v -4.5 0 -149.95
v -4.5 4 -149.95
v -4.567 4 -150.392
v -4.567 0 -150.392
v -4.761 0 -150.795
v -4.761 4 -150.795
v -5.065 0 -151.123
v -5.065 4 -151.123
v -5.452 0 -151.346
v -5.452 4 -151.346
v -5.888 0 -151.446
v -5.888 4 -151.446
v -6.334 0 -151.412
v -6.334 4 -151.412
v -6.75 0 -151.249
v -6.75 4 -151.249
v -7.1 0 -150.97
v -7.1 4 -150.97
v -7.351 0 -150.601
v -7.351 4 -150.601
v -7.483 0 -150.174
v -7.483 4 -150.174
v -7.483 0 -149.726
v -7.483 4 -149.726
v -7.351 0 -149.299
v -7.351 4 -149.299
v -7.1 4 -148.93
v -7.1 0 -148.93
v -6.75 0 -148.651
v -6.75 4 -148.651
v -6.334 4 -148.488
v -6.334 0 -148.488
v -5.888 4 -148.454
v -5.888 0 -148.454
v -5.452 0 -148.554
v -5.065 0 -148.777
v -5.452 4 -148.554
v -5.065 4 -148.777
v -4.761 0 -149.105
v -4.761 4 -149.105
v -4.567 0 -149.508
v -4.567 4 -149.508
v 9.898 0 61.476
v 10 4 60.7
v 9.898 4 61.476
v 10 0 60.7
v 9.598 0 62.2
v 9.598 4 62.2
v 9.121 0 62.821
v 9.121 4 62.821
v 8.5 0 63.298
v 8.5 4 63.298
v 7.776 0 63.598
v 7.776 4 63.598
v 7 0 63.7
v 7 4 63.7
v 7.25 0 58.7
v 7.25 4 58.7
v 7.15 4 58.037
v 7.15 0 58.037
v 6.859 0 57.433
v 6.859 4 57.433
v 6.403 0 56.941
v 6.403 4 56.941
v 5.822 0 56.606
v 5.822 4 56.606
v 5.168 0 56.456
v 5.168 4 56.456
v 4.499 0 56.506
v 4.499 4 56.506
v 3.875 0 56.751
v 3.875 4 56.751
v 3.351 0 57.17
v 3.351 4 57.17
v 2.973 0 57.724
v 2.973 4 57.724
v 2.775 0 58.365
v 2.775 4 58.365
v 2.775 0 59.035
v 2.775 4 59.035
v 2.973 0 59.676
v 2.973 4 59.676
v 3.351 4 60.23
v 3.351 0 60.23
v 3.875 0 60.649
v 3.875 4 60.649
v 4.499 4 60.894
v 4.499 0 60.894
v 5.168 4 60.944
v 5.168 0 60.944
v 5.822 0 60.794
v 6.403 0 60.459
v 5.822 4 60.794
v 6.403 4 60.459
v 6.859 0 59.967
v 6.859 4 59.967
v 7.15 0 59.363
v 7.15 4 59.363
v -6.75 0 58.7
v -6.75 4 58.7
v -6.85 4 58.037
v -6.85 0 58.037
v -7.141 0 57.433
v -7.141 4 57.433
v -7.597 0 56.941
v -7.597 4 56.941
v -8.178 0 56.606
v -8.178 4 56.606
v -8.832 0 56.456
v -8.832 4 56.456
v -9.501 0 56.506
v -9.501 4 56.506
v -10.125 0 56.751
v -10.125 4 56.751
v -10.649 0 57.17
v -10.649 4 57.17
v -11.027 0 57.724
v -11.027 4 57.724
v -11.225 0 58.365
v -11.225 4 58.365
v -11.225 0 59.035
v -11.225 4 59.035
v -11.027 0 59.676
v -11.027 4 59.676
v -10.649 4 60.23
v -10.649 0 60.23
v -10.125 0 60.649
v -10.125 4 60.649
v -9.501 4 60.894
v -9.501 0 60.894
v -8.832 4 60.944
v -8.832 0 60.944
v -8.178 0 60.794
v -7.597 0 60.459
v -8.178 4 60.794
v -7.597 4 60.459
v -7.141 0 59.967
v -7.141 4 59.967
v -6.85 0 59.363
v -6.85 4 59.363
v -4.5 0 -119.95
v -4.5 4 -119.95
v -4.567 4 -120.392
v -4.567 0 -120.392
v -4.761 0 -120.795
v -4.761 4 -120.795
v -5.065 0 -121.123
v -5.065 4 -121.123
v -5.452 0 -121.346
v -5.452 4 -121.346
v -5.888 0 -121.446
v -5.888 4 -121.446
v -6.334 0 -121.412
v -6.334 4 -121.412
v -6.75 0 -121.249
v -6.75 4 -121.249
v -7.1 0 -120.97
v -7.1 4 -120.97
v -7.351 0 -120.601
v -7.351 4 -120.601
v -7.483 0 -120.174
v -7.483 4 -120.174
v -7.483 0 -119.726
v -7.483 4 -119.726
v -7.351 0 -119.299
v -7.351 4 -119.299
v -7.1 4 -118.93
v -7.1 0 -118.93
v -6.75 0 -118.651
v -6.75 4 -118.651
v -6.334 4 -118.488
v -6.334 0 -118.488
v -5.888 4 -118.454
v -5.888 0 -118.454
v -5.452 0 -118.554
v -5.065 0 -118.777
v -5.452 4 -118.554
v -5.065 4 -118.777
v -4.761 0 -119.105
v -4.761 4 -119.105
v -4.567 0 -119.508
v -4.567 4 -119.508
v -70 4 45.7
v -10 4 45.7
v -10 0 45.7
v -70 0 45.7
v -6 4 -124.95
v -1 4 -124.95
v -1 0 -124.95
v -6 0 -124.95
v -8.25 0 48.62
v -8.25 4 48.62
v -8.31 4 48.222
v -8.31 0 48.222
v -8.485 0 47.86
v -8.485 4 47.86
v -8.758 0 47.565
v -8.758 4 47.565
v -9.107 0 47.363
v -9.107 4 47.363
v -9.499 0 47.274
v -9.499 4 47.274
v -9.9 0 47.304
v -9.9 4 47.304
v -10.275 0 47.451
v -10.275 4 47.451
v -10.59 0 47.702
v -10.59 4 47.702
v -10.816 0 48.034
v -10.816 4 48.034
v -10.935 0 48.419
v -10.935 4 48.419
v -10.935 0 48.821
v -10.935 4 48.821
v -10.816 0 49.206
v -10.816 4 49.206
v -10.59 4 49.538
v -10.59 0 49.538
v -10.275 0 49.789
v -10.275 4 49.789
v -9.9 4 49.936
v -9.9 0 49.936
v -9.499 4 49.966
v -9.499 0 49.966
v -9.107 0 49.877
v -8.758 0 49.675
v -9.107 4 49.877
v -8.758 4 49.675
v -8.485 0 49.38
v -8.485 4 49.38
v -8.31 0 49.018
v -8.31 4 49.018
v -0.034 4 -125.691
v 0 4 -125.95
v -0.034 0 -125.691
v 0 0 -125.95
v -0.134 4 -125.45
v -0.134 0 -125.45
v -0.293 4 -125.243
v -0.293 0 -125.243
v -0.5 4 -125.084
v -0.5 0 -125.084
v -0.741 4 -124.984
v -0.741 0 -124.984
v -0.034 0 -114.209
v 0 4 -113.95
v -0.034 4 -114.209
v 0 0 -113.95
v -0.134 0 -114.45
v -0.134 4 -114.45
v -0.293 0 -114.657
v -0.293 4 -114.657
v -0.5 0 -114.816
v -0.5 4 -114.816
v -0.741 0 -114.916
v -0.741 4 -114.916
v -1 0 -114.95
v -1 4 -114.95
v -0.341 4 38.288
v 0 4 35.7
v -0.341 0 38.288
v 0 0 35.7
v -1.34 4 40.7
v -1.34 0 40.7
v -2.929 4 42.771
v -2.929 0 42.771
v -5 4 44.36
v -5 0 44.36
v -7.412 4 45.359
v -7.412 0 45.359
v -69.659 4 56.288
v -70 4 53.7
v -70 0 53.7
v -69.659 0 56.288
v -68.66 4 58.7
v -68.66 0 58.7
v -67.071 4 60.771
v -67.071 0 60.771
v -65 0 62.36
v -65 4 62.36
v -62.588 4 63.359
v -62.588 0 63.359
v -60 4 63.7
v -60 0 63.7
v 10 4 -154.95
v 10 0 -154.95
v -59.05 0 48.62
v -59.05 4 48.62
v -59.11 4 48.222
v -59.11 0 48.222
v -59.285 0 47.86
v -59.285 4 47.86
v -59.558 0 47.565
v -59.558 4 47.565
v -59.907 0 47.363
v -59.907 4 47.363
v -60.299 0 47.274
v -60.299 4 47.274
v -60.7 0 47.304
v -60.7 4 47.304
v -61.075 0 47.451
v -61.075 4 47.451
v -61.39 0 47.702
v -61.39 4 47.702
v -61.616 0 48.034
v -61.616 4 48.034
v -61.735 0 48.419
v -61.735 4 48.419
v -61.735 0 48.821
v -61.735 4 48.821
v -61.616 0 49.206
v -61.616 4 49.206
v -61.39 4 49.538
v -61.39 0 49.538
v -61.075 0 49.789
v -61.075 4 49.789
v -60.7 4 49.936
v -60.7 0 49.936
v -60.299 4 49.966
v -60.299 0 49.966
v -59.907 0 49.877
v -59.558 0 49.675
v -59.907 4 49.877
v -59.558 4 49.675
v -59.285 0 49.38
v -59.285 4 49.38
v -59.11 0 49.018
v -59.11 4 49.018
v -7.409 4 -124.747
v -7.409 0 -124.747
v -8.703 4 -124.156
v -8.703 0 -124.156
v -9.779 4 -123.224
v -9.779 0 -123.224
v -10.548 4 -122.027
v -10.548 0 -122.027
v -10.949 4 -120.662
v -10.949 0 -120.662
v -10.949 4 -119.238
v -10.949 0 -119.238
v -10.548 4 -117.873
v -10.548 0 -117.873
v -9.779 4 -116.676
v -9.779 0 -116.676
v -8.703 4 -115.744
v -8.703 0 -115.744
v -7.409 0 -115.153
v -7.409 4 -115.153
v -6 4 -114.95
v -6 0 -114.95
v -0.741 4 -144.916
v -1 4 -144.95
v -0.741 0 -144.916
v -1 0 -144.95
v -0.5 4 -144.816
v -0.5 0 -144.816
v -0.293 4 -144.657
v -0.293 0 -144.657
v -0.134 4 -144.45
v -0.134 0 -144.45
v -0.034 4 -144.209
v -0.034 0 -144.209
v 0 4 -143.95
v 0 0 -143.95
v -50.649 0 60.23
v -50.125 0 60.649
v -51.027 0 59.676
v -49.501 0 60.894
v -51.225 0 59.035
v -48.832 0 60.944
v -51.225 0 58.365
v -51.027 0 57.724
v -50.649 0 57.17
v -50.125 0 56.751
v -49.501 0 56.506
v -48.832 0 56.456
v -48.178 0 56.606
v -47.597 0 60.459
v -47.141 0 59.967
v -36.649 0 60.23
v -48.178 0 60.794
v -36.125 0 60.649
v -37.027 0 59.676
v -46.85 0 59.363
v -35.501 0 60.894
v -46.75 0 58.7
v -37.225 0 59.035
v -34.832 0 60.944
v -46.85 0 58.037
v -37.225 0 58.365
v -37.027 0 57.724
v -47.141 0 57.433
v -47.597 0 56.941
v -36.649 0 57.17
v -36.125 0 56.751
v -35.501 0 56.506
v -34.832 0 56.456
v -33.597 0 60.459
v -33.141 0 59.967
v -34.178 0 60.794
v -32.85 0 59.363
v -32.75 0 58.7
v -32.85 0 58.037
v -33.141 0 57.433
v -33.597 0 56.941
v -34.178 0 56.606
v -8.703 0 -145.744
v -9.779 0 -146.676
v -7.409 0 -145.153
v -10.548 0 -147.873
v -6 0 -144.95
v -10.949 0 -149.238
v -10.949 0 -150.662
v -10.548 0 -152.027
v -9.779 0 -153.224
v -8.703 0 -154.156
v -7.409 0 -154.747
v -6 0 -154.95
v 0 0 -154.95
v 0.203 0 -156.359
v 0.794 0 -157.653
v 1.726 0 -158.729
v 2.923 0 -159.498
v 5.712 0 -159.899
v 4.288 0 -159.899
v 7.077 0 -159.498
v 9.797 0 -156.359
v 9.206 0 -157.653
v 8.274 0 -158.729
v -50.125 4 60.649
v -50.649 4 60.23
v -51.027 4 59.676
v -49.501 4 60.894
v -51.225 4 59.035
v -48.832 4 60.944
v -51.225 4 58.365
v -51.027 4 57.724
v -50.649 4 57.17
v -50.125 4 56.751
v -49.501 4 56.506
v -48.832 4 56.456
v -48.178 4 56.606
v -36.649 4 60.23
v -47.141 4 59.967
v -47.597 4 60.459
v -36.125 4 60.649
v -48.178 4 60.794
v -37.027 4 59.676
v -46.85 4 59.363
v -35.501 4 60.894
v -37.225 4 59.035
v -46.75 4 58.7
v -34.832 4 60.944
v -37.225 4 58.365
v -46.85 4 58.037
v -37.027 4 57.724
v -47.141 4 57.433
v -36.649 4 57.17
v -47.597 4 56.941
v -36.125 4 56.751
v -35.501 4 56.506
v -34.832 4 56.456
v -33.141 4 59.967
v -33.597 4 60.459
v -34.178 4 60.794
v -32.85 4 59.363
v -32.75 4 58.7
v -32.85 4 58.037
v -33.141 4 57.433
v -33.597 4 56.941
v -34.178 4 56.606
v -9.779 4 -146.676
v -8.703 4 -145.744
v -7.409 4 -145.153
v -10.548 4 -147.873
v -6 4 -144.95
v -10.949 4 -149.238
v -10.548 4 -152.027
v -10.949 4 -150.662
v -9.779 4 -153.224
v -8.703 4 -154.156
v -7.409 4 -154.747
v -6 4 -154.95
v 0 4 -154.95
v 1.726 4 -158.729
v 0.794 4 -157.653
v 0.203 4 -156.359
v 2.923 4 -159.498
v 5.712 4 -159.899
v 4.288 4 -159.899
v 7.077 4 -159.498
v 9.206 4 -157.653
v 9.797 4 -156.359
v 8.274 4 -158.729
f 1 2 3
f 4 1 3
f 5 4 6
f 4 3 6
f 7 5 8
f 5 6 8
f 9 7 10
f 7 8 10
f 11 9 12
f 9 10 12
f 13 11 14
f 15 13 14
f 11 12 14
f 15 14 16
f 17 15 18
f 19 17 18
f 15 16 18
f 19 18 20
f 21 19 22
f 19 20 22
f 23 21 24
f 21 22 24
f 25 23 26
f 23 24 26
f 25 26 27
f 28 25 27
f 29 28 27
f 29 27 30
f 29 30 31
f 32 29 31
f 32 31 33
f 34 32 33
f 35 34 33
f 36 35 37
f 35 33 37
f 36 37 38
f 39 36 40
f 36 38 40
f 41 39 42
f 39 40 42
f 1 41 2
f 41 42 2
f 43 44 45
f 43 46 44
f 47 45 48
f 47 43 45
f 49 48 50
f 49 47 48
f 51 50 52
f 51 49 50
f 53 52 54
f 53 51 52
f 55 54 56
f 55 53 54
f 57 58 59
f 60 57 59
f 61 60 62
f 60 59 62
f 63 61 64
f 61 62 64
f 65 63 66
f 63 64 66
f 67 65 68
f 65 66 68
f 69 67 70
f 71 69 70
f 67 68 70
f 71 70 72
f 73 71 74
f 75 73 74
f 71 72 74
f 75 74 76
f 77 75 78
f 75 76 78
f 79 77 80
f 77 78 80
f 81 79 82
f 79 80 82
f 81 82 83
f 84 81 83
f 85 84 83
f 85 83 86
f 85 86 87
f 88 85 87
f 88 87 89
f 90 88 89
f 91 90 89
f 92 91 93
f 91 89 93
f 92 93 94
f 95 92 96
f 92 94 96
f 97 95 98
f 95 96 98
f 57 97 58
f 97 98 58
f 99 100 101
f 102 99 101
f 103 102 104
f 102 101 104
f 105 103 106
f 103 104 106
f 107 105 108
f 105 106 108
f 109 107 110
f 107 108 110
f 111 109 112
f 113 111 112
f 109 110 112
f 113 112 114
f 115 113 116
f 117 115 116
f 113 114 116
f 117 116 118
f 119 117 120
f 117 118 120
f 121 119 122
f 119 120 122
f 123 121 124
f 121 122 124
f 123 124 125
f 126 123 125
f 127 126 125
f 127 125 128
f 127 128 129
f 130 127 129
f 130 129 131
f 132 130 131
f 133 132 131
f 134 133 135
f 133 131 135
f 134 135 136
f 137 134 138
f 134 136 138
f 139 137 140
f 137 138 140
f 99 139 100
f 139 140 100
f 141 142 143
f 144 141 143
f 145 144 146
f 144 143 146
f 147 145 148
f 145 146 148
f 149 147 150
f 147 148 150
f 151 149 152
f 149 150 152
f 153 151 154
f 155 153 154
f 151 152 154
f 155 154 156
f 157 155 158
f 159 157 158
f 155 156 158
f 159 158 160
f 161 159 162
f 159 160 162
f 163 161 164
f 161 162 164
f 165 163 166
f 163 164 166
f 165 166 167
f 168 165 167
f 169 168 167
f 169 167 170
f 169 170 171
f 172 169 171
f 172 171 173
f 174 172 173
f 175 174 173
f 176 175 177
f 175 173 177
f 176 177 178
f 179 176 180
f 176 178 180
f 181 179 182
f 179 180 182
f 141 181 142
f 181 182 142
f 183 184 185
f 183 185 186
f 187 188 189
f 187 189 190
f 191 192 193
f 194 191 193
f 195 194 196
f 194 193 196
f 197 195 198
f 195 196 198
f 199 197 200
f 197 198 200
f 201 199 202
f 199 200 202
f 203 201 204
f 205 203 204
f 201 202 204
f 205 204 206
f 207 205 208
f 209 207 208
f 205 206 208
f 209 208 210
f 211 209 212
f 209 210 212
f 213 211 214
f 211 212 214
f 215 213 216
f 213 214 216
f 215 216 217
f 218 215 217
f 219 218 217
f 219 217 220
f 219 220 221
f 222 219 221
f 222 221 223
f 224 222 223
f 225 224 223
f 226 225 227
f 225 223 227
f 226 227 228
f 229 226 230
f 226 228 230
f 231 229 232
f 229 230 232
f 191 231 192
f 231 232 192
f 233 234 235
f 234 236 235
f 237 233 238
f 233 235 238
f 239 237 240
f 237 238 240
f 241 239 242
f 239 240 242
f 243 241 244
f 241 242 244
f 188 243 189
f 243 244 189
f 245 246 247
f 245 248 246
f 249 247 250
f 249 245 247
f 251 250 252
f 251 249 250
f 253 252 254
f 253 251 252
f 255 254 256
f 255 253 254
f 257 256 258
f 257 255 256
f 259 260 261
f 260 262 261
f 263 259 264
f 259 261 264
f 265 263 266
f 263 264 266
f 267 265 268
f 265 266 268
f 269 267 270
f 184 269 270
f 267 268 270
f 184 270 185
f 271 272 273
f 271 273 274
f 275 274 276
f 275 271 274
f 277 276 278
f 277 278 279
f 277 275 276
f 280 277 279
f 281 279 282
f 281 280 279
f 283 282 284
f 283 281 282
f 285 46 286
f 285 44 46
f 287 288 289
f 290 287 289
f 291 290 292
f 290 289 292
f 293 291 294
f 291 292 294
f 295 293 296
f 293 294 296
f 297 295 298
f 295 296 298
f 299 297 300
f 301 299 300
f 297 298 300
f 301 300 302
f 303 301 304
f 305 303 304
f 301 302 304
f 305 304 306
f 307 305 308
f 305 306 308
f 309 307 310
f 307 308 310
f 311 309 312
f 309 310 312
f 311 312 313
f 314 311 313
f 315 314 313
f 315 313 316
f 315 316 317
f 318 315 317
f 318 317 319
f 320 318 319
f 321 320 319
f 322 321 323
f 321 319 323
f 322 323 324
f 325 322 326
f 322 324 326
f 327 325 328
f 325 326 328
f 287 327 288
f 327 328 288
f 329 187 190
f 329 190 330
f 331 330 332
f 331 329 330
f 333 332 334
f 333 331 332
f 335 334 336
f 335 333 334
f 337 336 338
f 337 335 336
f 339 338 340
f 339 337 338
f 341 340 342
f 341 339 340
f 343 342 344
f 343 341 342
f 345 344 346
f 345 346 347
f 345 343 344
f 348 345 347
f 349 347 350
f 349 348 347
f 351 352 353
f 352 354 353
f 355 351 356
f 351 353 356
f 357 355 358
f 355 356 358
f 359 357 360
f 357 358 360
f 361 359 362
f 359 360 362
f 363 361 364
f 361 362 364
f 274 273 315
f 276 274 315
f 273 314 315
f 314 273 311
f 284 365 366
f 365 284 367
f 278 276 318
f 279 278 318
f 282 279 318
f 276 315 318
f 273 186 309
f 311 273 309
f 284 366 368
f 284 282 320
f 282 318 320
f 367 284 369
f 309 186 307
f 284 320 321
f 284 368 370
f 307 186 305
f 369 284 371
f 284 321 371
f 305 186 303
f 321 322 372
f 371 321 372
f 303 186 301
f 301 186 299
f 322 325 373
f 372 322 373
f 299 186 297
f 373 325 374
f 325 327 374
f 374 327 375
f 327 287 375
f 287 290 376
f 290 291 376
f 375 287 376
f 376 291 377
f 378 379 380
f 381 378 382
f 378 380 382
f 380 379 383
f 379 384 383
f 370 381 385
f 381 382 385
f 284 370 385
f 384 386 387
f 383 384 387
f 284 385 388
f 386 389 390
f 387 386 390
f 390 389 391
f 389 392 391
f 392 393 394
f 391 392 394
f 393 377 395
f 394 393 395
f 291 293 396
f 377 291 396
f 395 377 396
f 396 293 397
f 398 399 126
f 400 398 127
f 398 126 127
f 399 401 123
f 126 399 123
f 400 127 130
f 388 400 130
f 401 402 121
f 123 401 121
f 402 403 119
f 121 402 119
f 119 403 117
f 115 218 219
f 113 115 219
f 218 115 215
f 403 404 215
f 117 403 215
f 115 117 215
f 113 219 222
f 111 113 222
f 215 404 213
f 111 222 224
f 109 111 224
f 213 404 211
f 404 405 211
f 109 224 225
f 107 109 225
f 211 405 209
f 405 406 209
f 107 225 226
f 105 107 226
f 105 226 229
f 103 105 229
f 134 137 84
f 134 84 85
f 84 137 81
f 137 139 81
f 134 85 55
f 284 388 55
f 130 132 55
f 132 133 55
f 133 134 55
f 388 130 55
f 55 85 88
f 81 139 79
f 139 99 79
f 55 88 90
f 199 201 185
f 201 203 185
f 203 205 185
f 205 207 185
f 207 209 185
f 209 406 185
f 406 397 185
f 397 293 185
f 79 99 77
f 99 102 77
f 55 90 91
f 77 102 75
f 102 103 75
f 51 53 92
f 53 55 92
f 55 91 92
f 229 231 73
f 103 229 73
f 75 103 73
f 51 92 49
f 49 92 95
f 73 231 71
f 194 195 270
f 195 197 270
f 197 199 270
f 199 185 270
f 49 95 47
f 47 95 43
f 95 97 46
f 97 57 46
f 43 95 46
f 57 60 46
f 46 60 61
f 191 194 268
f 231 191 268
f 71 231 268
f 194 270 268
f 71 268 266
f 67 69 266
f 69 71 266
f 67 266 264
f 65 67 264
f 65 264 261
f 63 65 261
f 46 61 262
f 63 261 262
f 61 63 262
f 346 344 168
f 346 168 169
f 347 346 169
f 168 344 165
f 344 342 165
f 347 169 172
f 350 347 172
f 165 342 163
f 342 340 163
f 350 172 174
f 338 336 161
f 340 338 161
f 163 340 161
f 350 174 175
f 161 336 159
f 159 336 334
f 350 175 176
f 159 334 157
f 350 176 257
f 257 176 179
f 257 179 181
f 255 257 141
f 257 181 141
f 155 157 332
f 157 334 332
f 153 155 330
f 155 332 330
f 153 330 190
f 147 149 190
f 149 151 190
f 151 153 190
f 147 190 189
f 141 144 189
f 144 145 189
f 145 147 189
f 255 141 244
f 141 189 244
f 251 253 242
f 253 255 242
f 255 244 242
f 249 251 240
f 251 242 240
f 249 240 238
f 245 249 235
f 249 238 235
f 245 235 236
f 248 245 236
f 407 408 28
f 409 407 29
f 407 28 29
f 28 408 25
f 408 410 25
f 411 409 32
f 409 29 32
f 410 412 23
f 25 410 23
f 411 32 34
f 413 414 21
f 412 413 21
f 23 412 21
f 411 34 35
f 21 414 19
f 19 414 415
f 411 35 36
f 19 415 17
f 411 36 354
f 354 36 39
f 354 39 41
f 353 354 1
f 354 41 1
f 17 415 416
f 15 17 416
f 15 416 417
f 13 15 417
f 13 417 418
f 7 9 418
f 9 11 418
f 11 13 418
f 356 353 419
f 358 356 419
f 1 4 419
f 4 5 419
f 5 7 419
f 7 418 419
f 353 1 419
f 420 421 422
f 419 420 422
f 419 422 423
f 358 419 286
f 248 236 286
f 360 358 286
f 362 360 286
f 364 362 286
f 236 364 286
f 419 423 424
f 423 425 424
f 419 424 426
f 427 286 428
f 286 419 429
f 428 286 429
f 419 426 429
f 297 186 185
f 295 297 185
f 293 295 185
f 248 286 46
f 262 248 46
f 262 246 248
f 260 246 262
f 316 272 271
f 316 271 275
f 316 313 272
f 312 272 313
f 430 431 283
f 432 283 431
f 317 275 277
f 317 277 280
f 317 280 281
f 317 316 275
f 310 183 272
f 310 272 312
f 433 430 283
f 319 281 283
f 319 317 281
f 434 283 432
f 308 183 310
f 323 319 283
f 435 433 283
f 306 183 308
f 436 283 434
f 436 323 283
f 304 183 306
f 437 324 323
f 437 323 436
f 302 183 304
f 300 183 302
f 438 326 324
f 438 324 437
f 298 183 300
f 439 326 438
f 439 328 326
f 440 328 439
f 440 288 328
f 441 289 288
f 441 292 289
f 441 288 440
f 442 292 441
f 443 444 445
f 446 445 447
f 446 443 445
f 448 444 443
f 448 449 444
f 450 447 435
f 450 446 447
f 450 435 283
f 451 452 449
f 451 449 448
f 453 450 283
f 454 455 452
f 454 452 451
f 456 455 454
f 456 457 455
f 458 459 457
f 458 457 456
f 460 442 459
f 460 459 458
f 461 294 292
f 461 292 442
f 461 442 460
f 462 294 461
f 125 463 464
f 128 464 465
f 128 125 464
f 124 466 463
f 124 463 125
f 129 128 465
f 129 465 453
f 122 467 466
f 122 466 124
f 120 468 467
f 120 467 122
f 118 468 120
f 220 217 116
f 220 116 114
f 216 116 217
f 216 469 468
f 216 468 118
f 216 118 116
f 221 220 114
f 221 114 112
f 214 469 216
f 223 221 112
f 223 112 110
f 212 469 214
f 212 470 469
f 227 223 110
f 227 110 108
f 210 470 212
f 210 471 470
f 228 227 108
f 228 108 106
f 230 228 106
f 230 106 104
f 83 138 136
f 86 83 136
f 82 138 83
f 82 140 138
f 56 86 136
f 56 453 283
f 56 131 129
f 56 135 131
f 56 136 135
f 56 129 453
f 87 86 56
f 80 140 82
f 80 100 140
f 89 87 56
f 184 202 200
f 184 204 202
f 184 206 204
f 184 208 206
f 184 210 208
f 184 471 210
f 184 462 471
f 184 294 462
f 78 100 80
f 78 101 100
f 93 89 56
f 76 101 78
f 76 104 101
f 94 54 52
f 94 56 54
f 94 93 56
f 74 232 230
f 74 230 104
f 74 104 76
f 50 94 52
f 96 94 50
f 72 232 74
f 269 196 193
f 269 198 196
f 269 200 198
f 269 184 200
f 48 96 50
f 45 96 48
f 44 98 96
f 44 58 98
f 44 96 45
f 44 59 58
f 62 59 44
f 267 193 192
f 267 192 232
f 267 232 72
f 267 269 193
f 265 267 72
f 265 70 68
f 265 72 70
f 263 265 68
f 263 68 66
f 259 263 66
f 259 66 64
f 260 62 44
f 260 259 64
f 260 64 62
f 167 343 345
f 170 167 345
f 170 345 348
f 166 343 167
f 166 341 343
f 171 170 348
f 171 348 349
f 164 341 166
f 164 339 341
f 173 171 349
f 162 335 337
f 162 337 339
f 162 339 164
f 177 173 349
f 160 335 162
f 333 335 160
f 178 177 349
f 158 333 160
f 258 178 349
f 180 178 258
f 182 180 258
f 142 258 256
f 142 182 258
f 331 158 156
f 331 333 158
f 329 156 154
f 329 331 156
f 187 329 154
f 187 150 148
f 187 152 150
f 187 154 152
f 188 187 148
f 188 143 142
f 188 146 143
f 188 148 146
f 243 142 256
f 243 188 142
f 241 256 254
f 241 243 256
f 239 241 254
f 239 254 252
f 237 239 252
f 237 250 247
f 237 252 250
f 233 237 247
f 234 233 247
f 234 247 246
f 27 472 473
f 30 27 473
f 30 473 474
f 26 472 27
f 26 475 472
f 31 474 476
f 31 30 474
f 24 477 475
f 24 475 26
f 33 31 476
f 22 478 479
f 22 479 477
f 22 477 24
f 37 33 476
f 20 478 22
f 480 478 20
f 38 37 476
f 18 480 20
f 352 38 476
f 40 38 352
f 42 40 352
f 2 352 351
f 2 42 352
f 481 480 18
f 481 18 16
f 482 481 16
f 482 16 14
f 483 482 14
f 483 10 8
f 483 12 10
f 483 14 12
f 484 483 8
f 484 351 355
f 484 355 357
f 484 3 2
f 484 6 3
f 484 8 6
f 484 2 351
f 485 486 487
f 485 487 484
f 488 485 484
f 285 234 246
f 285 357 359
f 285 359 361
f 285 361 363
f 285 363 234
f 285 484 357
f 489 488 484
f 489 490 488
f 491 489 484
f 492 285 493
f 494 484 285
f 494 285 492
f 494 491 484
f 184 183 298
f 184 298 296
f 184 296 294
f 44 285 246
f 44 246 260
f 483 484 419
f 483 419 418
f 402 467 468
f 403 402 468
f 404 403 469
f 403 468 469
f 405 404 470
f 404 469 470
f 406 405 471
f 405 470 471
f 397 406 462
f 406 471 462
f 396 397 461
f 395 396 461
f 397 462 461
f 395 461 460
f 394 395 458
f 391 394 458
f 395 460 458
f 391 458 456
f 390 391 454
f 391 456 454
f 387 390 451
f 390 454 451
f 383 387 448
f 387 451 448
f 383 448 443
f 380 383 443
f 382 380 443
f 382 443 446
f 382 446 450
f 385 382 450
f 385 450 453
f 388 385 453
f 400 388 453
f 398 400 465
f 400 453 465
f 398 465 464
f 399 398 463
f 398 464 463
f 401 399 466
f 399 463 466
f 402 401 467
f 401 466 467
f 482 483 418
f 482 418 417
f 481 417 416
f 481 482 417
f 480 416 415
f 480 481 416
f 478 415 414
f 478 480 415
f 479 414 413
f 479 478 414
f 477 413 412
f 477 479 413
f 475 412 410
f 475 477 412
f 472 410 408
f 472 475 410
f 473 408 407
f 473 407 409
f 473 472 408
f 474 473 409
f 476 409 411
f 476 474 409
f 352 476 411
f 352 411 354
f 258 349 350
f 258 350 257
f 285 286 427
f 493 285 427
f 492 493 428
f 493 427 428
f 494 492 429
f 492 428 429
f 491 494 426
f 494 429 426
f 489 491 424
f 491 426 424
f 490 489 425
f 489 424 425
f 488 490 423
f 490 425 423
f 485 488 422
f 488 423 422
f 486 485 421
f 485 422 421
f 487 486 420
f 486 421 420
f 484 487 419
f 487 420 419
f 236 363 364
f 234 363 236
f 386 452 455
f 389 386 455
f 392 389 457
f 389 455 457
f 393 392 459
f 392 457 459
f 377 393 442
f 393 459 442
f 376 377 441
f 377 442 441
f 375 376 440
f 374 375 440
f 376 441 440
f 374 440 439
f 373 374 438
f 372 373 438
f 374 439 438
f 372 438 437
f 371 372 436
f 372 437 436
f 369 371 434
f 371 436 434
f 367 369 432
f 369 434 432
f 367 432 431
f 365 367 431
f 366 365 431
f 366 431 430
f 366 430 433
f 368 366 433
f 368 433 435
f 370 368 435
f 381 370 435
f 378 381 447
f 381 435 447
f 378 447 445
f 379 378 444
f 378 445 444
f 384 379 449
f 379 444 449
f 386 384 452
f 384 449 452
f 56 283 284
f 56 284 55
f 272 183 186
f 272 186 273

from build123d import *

# Parameters (mm, degrees)
BOSS_EXTRUDE1_DEPTH = 4
SKETCH3_R           = 1.35
SKETCH3_R_2         = 2.25
BOSS_EXTRUDE3_DEPTH = 4
FILLET2_R           = 3
SKETCH6_R           = 1.5
BOSS_EXTRUDE5_DEPTH = 4
FILLET4_R           = 1
FILLET5_R           = 10


with BuildPart() as part:
    # Sketch1 → Boss-Extrude1 (new body)
    with BuildSketch(Plane(origin=(0, 0, 0), x_dir=(1, 0, 0), z_dir=(0, 1, 0))):
        with BuildLine():
            Line((0, 154.95), (0, 0))
            Line((0, 0), (10, 0))
            Line((10, 0), (10, 154.95))
            ThreePointArc((10, 154.95), (5, 159.95), (0, 154.95))
        make_face()
    extrude(amount=BOSS_EXTRUDE1_DEPTH)

    # Sketch3 → Boss-Extrude3 (add)
    with BuildSketch(Plane(origin=(0, 4, 0), x_dir=(1, 0, 0), z_dir=(0, 1, 0))):
        with BuildLine():
            Line((0, 0), (0, -45.7))
            Line((0, -45.7), (-70, -45.7))
            Line((-70, -45.7), (-70, -53.7))
            ThreePointArc((-70, -53.7), (-67.071067812, -60.771067812), (-60, -63.7))
            Line((-60, -63.7), (10, -63.7))
            Line((10, -63.7), (10, 0))
            Line((10, 0), (0, 0))
        make_face()
        with Locations((-60.4, -48.62)):
            Circle(SKETCH3_R, mode=Mode.SUBTRACT)
        with Locations((-49, -58.7)):
            Circle(SKETCH3_R_2, mode=Mode.SUBTRACT)
        with Locations((-35, -58.7)):
            Circle(SKETCH3_R_2, mode=Mode.SUBTRACT)
        with Locations((-9, -58.7)):
            Circle(SKETCH3_R_2, mode=Mode.SUBTRACT)
        with Locations((-9.6, -48.62)):
            Circle(SKETCH3_R, mode=Mode.SUBTRACT)
        with Locations((5, -58.7)):
            Circle(SKETCH3_R_2, mode=Mode.SUBTRACT)
    extrude(amount=-BOSS_EXTRUDE3_DEPTH)

    # Fillet2
    fillet2_edges = [part.edges().sort_by_distance(p)[0] for p in [
        (10, 2, 63.7),
    ]]
    fillet(fillet2_edges, radius=FILLET2_R)

    # Sketch6 → Boss-Extrude5 (add)
    with BuildSketch(Plane(origin=(0, 4, 0), x_dir=(1, 0, 0), z_dir=(0, 1, 0))):
        with BuildLine():
            Line((0, 154.95), (-6, 154.95))
            ThreePointArc((-6, 154.95), (-11, 149.95), (-6, 144.95))
            Line((-6, 144.95), (0, 144.95))
            Line((0, 144.95), (0, 154.95))
        make_face()
        with Locations((-6, 149.95)):
            Circle(SKETCH6_R, mode=Mode.SUBTRACT)
        with BuildLine():
            Line((0, 114.95), (0, 124.95))
            Line((0, 124.95), (-6, 124.95))
            ThreePointArc((-6, 124.95), (-11, 119.95), (-6, 114.95))
            Line((-6, 114.95), (0, 114.95))
        make_face()
        with Locations((-6, 119.95)):
            Circle(SKETCH6_R, mode=Mode.SUBTRACT)
    extrude(amount=-BOSS_EXTRUDE5_DEPTH)

    # Fillet4
    fillet4_edges = [part.edges().sort_by_distance(p)[0] for p in [
        (0, 2, -144.95),
        (0, 2, -124.95),
        (0, 2, -114.95),
    ]]
    fillet(fillet4_edges, radius=FILLET4_R)

    # Fillet5
    fillet5_edges = [part.edges().sort_by_distance(p)[0] for p in [
        (0, 2, 45.7),
    ]]
    fillet(fillet5_edges, radius=FILLET5_R)


solid = part.part
